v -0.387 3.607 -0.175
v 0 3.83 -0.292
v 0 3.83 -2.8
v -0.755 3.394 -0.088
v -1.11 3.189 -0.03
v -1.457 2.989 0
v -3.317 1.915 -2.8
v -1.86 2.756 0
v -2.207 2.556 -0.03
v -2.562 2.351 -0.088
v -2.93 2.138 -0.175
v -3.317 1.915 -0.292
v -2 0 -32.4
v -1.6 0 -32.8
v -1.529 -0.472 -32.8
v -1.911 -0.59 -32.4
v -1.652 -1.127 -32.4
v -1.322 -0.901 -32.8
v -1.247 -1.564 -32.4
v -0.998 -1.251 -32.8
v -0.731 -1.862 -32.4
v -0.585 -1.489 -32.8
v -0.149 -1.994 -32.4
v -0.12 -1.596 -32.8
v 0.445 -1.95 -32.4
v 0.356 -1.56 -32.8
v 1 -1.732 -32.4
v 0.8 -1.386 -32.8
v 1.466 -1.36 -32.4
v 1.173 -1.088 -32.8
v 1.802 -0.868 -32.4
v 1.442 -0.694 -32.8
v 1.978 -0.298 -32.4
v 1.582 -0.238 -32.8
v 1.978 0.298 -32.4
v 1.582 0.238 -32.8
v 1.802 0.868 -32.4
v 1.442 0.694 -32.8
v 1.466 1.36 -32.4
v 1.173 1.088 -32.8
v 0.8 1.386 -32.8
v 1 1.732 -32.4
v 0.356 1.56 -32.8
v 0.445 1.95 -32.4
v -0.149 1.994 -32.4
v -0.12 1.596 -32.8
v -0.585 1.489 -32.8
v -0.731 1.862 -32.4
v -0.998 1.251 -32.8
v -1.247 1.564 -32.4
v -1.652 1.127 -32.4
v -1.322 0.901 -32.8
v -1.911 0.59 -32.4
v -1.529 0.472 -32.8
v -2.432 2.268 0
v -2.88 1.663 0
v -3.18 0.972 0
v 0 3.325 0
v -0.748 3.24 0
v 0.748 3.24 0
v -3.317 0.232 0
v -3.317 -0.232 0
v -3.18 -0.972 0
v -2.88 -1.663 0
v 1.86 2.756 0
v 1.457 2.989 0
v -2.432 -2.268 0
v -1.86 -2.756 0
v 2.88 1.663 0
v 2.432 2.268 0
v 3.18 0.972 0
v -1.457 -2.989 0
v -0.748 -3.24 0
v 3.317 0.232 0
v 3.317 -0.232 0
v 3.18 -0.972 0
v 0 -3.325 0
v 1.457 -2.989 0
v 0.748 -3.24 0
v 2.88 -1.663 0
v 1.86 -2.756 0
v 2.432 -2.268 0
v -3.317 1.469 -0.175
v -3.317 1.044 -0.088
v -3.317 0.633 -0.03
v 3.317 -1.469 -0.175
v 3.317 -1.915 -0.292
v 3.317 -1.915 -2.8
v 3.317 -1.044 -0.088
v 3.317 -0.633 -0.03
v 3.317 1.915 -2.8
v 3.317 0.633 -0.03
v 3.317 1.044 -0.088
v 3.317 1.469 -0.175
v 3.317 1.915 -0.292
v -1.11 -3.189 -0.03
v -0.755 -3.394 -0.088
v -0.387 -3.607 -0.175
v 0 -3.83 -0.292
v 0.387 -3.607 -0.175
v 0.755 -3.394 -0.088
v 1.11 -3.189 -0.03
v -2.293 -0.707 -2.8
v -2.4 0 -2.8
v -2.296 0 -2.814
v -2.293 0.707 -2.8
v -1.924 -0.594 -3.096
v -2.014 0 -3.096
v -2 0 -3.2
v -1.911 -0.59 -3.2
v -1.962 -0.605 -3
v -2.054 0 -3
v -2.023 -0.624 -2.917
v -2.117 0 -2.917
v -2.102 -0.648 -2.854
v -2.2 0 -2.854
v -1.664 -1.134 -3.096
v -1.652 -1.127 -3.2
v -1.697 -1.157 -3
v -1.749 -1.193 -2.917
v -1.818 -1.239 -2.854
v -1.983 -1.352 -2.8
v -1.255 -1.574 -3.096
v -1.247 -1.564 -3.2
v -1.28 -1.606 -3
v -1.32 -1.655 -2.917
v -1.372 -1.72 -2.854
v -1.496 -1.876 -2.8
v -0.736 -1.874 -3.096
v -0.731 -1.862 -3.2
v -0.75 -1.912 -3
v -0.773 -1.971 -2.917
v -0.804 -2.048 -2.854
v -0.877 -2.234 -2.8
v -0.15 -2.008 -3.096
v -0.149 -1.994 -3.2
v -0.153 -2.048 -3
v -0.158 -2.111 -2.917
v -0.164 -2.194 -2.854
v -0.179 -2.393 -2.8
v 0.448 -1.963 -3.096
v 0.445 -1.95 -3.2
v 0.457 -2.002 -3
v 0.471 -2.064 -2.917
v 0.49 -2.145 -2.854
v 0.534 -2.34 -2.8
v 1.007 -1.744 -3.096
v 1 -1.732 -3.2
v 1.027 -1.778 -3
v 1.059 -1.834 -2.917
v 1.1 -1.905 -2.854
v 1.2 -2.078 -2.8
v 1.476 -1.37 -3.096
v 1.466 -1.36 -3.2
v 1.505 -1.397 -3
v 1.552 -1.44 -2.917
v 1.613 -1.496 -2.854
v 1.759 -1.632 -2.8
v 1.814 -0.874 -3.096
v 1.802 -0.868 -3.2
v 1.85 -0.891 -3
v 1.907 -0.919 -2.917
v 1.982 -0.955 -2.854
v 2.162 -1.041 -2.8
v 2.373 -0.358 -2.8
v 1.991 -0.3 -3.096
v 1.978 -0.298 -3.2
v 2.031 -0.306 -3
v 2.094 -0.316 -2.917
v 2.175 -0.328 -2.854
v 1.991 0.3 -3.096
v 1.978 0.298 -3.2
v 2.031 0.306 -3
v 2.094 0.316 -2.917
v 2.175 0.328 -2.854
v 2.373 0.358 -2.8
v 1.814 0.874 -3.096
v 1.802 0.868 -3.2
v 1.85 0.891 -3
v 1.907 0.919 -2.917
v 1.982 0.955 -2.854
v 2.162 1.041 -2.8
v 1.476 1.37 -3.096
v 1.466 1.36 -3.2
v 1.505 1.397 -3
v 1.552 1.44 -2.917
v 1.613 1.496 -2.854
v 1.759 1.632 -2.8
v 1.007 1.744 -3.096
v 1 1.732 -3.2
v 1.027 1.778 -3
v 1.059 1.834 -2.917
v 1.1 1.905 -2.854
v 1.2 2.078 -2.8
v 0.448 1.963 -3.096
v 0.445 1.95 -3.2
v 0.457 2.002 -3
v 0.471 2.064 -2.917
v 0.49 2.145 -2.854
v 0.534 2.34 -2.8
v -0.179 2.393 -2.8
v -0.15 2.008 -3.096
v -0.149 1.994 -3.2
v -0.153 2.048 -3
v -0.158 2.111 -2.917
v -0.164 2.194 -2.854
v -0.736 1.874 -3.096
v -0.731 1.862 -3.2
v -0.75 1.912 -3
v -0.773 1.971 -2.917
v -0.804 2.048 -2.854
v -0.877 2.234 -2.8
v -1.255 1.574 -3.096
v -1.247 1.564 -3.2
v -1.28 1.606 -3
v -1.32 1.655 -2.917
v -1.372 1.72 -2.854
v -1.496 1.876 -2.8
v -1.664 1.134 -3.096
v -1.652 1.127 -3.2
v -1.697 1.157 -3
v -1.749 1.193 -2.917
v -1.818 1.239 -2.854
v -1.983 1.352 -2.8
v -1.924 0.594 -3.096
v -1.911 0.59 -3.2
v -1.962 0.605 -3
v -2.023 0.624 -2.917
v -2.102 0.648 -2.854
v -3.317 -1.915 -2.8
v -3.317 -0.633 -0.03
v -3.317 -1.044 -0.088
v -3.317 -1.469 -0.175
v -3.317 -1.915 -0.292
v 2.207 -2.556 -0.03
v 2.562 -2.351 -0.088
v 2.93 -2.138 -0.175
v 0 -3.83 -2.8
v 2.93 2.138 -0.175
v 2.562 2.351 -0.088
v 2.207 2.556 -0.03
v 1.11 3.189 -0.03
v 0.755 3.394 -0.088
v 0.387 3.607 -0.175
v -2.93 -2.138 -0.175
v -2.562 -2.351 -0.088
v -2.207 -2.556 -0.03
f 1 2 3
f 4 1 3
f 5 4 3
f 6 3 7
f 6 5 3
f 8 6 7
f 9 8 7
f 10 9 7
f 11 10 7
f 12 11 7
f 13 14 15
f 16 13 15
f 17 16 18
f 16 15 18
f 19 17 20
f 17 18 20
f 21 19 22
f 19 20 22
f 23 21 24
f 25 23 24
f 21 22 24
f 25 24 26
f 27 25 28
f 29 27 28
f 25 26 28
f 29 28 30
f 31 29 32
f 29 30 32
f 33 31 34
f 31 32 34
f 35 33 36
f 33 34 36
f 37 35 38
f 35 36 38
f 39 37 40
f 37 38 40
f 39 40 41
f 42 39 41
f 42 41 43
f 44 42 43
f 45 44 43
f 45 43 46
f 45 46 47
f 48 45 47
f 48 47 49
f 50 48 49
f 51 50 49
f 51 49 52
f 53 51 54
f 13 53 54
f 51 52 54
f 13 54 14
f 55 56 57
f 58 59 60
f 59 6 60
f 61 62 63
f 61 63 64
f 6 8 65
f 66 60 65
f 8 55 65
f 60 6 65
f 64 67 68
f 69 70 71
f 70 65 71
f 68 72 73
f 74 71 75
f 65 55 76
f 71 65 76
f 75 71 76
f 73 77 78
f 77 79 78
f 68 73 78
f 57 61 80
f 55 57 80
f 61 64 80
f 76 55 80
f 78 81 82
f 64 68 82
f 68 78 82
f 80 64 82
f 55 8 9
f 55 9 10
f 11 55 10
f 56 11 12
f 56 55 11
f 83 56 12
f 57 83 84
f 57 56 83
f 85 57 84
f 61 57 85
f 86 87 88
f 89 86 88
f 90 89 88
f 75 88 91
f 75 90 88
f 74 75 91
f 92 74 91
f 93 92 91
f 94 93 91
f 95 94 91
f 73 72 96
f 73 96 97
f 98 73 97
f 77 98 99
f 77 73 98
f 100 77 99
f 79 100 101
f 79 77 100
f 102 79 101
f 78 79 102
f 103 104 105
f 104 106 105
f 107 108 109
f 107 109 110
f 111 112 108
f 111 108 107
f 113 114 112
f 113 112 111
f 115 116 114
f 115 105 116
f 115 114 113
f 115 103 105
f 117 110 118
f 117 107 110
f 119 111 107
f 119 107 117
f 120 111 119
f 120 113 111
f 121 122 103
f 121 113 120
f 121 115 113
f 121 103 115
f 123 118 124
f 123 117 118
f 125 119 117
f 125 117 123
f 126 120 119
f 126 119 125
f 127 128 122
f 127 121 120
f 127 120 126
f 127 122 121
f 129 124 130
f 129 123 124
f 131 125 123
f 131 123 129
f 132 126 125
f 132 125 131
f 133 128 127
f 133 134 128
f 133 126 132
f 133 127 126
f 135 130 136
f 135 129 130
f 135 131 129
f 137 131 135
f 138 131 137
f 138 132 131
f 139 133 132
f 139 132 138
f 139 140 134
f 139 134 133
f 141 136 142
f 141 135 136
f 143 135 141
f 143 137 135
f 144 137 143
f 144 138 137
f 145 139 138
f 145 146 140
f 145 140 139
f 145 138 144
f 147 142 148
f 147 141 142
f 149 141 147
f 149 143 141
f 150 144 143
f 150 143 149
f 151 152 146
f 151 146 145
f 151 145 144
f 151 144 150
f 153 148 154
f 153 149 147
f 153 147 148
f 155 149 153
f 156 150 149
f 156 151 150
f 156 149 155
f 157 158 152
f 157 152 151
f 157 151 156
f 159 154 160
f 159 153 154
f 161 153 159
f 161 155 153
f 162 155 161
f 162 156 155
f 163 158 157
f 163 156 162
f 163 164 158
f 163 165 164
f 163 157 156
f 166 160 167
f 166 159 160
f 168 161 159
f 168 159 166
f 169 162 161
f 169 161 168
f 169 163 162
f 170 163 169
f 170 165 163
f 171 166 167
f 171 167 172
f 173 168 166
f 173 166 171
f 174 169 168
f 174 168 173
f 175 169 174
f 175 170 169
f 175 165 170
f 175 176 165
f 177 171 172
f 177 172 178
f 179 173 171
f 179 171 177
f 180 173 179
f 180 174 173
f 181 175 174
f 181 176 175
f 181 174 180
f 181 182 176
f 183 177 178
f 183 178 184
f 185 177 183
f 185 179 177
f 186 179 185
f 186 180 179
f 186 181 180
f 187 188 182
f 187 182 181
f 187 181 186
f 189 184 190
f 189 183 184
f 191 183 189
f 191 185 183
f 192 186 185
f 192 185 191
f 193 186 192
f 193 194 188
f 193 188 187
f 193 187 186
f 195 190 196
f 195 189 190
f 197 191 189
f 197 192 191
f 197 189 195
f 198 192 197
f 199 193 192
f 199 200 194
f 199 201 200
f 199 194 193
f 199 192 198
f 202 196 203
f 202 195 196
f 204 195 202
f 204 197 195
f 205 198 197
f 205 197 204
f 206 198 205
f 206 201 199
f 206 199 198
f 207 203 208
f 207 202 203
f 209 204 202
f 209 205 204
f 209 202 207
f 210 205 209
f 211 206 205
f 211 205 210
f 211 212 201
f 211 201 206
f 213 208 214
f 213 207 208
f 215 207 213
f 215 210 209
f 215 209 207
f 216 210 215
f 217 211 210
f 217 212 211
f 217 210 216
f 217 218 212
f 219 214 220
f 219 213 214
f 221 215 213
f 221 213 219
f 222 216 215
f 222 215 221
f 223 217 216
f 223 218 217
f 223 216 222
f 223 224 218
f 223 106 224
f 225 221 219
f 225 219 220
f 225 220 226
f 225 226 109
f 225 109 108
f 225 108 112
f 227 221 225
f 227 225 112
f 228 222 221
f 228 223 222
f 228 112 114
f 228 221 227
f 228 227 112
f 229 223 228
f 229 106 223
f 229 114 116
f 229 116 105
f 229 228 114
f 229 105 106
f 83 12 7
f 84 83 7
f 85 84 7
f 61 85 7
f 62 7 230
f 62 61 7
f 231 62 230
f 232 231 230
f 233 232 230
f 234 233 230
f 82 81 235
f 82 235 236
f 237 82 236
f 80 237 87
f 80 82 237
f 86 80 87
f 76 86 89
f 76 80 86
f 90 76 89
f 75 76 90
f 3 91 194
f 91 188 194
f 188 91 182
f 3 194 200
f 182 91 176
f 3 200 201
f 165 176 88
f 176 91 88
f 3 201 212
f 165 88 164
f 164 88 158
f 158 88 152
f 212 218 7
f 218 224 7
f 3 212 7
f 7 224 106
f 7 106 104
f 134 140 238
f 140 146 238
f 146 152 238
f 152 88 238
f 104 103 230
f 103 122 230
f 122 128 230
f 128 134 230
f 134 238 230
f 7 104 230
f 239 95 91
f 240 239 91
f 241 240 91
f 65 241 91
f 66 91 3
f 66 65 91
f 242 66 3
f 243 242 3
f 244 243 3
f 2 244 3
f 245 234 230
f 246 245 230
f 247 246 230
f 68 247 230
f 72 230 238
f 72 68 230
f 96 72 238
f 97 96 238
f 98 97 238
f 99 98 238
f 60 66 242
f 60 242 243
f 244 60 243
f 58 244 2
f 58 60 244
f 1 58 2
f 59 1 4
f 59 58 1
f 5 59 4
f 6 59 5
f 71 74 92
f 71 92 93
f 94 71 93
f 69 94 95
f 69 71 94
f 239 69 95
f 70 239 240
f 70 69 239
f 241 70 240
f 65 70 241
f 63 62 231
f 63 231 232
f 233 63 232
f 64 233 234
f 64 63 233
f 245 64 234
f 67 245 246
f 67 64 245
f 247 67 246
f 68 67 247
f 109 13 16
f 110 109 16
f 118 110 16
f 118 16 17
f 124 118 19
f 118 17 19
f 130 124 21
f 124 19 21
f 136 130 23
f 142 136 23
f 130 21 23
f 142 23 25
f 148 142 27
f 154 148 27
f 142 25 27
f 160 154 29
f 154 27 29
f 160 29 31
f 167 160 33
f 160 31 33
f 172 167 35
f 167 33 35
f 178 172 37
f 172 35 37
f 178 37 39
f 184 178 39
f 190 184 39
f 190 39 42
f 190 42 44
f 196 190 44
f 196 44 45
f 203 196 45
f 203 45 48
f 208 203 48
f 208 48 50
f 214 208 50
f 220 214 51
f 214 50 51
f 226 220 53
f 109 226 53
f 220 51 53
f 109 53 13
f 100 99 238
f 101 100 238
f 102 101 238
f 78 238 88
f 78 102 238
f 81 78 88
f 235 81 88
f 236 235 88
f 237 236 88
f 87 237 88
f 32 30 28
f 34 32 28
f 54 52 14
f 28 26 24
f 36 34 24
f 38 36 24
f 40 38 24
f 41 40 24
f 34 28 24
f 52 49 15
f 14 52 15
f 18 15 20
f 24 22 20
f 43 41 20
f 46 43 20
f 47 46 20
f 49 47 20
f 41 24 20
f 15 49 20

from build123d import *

# Parameters (mm, degrees)
SKETCH_2_OUTSIDE_W  = 16.94
SKETCH_2_OUTSIDE_H  = 16.94
CUT_EXTRUDE_1_DEPTH = 2.8
CHAMFER_1_SIZE      = 0.4
FILLET_1_R          = 0.4


with BuildPart() as part:
    # Эскиз1 → Повернуть1 (revolve)
    with BuildSketch(Plane(origin=(0, 0, 0), x_dir=(1, 0, 0), z_dir=(0, 1, 0))):
        Polygon((0, 0), (-4, 0), (-4, 2.8), (-2, 2.8), (-2, 32.8), (0, 32.8), align=None)
    revolve(axis=Axis((0, 0, -32.8), (0, 0, 1)))

    # Эскиз2 outside → Вырез-Вытянуть1 (cut)
    with BuildSketch(Plane.XY):
        Rectangle(SKETCH_2_OUTSIDE_W, SKETCH_2_OUTSIDE_H)
        Polygon((0, 3.83), (-3.316877296, 1.915), (-3.316877296, -1.915), (0, -3.83), (3.316877296, -1.915), (3.316877296, 1.915), align=None, mode=Mode.SUBTRACT)
    extrude(amount=-CUT_EXTRUDE_1_DEPTH, mode=Mode.SUBTRACT)

    # Эскиз3 → Вырез-Повернуть1 (revolve, cut)
    with BuildSketch(Plane(origin=(0, 0, 0), x_dir=(0, 0, -1), z_dir=(1, 0, 0))):
        Polygon((0, 3.83), (0.291561886, 3.83), (0, 3.325), align=None)
    revolve(axis=Axis((0, 0, 0), (0, 0, 1)), mode=Mode.SUBTRACT)

    # Фаска1
    chamfer_1_edges = [part.edges().sort_by_distance(p)[0] for p in [
        (2, 0, -32.8),
    ]]
    chamfer(chamfer_1_edges, length=CHAMFER_1_SIZE)

    # Скругление1
    fillet_1_edges = [part.edges().sort_by_distance(p)[0] for p in [
        (2, 0, -2.8),
    ]]
    fillet(fillet_1_edges, radius=FILLET_1_R)


solid = part.part
